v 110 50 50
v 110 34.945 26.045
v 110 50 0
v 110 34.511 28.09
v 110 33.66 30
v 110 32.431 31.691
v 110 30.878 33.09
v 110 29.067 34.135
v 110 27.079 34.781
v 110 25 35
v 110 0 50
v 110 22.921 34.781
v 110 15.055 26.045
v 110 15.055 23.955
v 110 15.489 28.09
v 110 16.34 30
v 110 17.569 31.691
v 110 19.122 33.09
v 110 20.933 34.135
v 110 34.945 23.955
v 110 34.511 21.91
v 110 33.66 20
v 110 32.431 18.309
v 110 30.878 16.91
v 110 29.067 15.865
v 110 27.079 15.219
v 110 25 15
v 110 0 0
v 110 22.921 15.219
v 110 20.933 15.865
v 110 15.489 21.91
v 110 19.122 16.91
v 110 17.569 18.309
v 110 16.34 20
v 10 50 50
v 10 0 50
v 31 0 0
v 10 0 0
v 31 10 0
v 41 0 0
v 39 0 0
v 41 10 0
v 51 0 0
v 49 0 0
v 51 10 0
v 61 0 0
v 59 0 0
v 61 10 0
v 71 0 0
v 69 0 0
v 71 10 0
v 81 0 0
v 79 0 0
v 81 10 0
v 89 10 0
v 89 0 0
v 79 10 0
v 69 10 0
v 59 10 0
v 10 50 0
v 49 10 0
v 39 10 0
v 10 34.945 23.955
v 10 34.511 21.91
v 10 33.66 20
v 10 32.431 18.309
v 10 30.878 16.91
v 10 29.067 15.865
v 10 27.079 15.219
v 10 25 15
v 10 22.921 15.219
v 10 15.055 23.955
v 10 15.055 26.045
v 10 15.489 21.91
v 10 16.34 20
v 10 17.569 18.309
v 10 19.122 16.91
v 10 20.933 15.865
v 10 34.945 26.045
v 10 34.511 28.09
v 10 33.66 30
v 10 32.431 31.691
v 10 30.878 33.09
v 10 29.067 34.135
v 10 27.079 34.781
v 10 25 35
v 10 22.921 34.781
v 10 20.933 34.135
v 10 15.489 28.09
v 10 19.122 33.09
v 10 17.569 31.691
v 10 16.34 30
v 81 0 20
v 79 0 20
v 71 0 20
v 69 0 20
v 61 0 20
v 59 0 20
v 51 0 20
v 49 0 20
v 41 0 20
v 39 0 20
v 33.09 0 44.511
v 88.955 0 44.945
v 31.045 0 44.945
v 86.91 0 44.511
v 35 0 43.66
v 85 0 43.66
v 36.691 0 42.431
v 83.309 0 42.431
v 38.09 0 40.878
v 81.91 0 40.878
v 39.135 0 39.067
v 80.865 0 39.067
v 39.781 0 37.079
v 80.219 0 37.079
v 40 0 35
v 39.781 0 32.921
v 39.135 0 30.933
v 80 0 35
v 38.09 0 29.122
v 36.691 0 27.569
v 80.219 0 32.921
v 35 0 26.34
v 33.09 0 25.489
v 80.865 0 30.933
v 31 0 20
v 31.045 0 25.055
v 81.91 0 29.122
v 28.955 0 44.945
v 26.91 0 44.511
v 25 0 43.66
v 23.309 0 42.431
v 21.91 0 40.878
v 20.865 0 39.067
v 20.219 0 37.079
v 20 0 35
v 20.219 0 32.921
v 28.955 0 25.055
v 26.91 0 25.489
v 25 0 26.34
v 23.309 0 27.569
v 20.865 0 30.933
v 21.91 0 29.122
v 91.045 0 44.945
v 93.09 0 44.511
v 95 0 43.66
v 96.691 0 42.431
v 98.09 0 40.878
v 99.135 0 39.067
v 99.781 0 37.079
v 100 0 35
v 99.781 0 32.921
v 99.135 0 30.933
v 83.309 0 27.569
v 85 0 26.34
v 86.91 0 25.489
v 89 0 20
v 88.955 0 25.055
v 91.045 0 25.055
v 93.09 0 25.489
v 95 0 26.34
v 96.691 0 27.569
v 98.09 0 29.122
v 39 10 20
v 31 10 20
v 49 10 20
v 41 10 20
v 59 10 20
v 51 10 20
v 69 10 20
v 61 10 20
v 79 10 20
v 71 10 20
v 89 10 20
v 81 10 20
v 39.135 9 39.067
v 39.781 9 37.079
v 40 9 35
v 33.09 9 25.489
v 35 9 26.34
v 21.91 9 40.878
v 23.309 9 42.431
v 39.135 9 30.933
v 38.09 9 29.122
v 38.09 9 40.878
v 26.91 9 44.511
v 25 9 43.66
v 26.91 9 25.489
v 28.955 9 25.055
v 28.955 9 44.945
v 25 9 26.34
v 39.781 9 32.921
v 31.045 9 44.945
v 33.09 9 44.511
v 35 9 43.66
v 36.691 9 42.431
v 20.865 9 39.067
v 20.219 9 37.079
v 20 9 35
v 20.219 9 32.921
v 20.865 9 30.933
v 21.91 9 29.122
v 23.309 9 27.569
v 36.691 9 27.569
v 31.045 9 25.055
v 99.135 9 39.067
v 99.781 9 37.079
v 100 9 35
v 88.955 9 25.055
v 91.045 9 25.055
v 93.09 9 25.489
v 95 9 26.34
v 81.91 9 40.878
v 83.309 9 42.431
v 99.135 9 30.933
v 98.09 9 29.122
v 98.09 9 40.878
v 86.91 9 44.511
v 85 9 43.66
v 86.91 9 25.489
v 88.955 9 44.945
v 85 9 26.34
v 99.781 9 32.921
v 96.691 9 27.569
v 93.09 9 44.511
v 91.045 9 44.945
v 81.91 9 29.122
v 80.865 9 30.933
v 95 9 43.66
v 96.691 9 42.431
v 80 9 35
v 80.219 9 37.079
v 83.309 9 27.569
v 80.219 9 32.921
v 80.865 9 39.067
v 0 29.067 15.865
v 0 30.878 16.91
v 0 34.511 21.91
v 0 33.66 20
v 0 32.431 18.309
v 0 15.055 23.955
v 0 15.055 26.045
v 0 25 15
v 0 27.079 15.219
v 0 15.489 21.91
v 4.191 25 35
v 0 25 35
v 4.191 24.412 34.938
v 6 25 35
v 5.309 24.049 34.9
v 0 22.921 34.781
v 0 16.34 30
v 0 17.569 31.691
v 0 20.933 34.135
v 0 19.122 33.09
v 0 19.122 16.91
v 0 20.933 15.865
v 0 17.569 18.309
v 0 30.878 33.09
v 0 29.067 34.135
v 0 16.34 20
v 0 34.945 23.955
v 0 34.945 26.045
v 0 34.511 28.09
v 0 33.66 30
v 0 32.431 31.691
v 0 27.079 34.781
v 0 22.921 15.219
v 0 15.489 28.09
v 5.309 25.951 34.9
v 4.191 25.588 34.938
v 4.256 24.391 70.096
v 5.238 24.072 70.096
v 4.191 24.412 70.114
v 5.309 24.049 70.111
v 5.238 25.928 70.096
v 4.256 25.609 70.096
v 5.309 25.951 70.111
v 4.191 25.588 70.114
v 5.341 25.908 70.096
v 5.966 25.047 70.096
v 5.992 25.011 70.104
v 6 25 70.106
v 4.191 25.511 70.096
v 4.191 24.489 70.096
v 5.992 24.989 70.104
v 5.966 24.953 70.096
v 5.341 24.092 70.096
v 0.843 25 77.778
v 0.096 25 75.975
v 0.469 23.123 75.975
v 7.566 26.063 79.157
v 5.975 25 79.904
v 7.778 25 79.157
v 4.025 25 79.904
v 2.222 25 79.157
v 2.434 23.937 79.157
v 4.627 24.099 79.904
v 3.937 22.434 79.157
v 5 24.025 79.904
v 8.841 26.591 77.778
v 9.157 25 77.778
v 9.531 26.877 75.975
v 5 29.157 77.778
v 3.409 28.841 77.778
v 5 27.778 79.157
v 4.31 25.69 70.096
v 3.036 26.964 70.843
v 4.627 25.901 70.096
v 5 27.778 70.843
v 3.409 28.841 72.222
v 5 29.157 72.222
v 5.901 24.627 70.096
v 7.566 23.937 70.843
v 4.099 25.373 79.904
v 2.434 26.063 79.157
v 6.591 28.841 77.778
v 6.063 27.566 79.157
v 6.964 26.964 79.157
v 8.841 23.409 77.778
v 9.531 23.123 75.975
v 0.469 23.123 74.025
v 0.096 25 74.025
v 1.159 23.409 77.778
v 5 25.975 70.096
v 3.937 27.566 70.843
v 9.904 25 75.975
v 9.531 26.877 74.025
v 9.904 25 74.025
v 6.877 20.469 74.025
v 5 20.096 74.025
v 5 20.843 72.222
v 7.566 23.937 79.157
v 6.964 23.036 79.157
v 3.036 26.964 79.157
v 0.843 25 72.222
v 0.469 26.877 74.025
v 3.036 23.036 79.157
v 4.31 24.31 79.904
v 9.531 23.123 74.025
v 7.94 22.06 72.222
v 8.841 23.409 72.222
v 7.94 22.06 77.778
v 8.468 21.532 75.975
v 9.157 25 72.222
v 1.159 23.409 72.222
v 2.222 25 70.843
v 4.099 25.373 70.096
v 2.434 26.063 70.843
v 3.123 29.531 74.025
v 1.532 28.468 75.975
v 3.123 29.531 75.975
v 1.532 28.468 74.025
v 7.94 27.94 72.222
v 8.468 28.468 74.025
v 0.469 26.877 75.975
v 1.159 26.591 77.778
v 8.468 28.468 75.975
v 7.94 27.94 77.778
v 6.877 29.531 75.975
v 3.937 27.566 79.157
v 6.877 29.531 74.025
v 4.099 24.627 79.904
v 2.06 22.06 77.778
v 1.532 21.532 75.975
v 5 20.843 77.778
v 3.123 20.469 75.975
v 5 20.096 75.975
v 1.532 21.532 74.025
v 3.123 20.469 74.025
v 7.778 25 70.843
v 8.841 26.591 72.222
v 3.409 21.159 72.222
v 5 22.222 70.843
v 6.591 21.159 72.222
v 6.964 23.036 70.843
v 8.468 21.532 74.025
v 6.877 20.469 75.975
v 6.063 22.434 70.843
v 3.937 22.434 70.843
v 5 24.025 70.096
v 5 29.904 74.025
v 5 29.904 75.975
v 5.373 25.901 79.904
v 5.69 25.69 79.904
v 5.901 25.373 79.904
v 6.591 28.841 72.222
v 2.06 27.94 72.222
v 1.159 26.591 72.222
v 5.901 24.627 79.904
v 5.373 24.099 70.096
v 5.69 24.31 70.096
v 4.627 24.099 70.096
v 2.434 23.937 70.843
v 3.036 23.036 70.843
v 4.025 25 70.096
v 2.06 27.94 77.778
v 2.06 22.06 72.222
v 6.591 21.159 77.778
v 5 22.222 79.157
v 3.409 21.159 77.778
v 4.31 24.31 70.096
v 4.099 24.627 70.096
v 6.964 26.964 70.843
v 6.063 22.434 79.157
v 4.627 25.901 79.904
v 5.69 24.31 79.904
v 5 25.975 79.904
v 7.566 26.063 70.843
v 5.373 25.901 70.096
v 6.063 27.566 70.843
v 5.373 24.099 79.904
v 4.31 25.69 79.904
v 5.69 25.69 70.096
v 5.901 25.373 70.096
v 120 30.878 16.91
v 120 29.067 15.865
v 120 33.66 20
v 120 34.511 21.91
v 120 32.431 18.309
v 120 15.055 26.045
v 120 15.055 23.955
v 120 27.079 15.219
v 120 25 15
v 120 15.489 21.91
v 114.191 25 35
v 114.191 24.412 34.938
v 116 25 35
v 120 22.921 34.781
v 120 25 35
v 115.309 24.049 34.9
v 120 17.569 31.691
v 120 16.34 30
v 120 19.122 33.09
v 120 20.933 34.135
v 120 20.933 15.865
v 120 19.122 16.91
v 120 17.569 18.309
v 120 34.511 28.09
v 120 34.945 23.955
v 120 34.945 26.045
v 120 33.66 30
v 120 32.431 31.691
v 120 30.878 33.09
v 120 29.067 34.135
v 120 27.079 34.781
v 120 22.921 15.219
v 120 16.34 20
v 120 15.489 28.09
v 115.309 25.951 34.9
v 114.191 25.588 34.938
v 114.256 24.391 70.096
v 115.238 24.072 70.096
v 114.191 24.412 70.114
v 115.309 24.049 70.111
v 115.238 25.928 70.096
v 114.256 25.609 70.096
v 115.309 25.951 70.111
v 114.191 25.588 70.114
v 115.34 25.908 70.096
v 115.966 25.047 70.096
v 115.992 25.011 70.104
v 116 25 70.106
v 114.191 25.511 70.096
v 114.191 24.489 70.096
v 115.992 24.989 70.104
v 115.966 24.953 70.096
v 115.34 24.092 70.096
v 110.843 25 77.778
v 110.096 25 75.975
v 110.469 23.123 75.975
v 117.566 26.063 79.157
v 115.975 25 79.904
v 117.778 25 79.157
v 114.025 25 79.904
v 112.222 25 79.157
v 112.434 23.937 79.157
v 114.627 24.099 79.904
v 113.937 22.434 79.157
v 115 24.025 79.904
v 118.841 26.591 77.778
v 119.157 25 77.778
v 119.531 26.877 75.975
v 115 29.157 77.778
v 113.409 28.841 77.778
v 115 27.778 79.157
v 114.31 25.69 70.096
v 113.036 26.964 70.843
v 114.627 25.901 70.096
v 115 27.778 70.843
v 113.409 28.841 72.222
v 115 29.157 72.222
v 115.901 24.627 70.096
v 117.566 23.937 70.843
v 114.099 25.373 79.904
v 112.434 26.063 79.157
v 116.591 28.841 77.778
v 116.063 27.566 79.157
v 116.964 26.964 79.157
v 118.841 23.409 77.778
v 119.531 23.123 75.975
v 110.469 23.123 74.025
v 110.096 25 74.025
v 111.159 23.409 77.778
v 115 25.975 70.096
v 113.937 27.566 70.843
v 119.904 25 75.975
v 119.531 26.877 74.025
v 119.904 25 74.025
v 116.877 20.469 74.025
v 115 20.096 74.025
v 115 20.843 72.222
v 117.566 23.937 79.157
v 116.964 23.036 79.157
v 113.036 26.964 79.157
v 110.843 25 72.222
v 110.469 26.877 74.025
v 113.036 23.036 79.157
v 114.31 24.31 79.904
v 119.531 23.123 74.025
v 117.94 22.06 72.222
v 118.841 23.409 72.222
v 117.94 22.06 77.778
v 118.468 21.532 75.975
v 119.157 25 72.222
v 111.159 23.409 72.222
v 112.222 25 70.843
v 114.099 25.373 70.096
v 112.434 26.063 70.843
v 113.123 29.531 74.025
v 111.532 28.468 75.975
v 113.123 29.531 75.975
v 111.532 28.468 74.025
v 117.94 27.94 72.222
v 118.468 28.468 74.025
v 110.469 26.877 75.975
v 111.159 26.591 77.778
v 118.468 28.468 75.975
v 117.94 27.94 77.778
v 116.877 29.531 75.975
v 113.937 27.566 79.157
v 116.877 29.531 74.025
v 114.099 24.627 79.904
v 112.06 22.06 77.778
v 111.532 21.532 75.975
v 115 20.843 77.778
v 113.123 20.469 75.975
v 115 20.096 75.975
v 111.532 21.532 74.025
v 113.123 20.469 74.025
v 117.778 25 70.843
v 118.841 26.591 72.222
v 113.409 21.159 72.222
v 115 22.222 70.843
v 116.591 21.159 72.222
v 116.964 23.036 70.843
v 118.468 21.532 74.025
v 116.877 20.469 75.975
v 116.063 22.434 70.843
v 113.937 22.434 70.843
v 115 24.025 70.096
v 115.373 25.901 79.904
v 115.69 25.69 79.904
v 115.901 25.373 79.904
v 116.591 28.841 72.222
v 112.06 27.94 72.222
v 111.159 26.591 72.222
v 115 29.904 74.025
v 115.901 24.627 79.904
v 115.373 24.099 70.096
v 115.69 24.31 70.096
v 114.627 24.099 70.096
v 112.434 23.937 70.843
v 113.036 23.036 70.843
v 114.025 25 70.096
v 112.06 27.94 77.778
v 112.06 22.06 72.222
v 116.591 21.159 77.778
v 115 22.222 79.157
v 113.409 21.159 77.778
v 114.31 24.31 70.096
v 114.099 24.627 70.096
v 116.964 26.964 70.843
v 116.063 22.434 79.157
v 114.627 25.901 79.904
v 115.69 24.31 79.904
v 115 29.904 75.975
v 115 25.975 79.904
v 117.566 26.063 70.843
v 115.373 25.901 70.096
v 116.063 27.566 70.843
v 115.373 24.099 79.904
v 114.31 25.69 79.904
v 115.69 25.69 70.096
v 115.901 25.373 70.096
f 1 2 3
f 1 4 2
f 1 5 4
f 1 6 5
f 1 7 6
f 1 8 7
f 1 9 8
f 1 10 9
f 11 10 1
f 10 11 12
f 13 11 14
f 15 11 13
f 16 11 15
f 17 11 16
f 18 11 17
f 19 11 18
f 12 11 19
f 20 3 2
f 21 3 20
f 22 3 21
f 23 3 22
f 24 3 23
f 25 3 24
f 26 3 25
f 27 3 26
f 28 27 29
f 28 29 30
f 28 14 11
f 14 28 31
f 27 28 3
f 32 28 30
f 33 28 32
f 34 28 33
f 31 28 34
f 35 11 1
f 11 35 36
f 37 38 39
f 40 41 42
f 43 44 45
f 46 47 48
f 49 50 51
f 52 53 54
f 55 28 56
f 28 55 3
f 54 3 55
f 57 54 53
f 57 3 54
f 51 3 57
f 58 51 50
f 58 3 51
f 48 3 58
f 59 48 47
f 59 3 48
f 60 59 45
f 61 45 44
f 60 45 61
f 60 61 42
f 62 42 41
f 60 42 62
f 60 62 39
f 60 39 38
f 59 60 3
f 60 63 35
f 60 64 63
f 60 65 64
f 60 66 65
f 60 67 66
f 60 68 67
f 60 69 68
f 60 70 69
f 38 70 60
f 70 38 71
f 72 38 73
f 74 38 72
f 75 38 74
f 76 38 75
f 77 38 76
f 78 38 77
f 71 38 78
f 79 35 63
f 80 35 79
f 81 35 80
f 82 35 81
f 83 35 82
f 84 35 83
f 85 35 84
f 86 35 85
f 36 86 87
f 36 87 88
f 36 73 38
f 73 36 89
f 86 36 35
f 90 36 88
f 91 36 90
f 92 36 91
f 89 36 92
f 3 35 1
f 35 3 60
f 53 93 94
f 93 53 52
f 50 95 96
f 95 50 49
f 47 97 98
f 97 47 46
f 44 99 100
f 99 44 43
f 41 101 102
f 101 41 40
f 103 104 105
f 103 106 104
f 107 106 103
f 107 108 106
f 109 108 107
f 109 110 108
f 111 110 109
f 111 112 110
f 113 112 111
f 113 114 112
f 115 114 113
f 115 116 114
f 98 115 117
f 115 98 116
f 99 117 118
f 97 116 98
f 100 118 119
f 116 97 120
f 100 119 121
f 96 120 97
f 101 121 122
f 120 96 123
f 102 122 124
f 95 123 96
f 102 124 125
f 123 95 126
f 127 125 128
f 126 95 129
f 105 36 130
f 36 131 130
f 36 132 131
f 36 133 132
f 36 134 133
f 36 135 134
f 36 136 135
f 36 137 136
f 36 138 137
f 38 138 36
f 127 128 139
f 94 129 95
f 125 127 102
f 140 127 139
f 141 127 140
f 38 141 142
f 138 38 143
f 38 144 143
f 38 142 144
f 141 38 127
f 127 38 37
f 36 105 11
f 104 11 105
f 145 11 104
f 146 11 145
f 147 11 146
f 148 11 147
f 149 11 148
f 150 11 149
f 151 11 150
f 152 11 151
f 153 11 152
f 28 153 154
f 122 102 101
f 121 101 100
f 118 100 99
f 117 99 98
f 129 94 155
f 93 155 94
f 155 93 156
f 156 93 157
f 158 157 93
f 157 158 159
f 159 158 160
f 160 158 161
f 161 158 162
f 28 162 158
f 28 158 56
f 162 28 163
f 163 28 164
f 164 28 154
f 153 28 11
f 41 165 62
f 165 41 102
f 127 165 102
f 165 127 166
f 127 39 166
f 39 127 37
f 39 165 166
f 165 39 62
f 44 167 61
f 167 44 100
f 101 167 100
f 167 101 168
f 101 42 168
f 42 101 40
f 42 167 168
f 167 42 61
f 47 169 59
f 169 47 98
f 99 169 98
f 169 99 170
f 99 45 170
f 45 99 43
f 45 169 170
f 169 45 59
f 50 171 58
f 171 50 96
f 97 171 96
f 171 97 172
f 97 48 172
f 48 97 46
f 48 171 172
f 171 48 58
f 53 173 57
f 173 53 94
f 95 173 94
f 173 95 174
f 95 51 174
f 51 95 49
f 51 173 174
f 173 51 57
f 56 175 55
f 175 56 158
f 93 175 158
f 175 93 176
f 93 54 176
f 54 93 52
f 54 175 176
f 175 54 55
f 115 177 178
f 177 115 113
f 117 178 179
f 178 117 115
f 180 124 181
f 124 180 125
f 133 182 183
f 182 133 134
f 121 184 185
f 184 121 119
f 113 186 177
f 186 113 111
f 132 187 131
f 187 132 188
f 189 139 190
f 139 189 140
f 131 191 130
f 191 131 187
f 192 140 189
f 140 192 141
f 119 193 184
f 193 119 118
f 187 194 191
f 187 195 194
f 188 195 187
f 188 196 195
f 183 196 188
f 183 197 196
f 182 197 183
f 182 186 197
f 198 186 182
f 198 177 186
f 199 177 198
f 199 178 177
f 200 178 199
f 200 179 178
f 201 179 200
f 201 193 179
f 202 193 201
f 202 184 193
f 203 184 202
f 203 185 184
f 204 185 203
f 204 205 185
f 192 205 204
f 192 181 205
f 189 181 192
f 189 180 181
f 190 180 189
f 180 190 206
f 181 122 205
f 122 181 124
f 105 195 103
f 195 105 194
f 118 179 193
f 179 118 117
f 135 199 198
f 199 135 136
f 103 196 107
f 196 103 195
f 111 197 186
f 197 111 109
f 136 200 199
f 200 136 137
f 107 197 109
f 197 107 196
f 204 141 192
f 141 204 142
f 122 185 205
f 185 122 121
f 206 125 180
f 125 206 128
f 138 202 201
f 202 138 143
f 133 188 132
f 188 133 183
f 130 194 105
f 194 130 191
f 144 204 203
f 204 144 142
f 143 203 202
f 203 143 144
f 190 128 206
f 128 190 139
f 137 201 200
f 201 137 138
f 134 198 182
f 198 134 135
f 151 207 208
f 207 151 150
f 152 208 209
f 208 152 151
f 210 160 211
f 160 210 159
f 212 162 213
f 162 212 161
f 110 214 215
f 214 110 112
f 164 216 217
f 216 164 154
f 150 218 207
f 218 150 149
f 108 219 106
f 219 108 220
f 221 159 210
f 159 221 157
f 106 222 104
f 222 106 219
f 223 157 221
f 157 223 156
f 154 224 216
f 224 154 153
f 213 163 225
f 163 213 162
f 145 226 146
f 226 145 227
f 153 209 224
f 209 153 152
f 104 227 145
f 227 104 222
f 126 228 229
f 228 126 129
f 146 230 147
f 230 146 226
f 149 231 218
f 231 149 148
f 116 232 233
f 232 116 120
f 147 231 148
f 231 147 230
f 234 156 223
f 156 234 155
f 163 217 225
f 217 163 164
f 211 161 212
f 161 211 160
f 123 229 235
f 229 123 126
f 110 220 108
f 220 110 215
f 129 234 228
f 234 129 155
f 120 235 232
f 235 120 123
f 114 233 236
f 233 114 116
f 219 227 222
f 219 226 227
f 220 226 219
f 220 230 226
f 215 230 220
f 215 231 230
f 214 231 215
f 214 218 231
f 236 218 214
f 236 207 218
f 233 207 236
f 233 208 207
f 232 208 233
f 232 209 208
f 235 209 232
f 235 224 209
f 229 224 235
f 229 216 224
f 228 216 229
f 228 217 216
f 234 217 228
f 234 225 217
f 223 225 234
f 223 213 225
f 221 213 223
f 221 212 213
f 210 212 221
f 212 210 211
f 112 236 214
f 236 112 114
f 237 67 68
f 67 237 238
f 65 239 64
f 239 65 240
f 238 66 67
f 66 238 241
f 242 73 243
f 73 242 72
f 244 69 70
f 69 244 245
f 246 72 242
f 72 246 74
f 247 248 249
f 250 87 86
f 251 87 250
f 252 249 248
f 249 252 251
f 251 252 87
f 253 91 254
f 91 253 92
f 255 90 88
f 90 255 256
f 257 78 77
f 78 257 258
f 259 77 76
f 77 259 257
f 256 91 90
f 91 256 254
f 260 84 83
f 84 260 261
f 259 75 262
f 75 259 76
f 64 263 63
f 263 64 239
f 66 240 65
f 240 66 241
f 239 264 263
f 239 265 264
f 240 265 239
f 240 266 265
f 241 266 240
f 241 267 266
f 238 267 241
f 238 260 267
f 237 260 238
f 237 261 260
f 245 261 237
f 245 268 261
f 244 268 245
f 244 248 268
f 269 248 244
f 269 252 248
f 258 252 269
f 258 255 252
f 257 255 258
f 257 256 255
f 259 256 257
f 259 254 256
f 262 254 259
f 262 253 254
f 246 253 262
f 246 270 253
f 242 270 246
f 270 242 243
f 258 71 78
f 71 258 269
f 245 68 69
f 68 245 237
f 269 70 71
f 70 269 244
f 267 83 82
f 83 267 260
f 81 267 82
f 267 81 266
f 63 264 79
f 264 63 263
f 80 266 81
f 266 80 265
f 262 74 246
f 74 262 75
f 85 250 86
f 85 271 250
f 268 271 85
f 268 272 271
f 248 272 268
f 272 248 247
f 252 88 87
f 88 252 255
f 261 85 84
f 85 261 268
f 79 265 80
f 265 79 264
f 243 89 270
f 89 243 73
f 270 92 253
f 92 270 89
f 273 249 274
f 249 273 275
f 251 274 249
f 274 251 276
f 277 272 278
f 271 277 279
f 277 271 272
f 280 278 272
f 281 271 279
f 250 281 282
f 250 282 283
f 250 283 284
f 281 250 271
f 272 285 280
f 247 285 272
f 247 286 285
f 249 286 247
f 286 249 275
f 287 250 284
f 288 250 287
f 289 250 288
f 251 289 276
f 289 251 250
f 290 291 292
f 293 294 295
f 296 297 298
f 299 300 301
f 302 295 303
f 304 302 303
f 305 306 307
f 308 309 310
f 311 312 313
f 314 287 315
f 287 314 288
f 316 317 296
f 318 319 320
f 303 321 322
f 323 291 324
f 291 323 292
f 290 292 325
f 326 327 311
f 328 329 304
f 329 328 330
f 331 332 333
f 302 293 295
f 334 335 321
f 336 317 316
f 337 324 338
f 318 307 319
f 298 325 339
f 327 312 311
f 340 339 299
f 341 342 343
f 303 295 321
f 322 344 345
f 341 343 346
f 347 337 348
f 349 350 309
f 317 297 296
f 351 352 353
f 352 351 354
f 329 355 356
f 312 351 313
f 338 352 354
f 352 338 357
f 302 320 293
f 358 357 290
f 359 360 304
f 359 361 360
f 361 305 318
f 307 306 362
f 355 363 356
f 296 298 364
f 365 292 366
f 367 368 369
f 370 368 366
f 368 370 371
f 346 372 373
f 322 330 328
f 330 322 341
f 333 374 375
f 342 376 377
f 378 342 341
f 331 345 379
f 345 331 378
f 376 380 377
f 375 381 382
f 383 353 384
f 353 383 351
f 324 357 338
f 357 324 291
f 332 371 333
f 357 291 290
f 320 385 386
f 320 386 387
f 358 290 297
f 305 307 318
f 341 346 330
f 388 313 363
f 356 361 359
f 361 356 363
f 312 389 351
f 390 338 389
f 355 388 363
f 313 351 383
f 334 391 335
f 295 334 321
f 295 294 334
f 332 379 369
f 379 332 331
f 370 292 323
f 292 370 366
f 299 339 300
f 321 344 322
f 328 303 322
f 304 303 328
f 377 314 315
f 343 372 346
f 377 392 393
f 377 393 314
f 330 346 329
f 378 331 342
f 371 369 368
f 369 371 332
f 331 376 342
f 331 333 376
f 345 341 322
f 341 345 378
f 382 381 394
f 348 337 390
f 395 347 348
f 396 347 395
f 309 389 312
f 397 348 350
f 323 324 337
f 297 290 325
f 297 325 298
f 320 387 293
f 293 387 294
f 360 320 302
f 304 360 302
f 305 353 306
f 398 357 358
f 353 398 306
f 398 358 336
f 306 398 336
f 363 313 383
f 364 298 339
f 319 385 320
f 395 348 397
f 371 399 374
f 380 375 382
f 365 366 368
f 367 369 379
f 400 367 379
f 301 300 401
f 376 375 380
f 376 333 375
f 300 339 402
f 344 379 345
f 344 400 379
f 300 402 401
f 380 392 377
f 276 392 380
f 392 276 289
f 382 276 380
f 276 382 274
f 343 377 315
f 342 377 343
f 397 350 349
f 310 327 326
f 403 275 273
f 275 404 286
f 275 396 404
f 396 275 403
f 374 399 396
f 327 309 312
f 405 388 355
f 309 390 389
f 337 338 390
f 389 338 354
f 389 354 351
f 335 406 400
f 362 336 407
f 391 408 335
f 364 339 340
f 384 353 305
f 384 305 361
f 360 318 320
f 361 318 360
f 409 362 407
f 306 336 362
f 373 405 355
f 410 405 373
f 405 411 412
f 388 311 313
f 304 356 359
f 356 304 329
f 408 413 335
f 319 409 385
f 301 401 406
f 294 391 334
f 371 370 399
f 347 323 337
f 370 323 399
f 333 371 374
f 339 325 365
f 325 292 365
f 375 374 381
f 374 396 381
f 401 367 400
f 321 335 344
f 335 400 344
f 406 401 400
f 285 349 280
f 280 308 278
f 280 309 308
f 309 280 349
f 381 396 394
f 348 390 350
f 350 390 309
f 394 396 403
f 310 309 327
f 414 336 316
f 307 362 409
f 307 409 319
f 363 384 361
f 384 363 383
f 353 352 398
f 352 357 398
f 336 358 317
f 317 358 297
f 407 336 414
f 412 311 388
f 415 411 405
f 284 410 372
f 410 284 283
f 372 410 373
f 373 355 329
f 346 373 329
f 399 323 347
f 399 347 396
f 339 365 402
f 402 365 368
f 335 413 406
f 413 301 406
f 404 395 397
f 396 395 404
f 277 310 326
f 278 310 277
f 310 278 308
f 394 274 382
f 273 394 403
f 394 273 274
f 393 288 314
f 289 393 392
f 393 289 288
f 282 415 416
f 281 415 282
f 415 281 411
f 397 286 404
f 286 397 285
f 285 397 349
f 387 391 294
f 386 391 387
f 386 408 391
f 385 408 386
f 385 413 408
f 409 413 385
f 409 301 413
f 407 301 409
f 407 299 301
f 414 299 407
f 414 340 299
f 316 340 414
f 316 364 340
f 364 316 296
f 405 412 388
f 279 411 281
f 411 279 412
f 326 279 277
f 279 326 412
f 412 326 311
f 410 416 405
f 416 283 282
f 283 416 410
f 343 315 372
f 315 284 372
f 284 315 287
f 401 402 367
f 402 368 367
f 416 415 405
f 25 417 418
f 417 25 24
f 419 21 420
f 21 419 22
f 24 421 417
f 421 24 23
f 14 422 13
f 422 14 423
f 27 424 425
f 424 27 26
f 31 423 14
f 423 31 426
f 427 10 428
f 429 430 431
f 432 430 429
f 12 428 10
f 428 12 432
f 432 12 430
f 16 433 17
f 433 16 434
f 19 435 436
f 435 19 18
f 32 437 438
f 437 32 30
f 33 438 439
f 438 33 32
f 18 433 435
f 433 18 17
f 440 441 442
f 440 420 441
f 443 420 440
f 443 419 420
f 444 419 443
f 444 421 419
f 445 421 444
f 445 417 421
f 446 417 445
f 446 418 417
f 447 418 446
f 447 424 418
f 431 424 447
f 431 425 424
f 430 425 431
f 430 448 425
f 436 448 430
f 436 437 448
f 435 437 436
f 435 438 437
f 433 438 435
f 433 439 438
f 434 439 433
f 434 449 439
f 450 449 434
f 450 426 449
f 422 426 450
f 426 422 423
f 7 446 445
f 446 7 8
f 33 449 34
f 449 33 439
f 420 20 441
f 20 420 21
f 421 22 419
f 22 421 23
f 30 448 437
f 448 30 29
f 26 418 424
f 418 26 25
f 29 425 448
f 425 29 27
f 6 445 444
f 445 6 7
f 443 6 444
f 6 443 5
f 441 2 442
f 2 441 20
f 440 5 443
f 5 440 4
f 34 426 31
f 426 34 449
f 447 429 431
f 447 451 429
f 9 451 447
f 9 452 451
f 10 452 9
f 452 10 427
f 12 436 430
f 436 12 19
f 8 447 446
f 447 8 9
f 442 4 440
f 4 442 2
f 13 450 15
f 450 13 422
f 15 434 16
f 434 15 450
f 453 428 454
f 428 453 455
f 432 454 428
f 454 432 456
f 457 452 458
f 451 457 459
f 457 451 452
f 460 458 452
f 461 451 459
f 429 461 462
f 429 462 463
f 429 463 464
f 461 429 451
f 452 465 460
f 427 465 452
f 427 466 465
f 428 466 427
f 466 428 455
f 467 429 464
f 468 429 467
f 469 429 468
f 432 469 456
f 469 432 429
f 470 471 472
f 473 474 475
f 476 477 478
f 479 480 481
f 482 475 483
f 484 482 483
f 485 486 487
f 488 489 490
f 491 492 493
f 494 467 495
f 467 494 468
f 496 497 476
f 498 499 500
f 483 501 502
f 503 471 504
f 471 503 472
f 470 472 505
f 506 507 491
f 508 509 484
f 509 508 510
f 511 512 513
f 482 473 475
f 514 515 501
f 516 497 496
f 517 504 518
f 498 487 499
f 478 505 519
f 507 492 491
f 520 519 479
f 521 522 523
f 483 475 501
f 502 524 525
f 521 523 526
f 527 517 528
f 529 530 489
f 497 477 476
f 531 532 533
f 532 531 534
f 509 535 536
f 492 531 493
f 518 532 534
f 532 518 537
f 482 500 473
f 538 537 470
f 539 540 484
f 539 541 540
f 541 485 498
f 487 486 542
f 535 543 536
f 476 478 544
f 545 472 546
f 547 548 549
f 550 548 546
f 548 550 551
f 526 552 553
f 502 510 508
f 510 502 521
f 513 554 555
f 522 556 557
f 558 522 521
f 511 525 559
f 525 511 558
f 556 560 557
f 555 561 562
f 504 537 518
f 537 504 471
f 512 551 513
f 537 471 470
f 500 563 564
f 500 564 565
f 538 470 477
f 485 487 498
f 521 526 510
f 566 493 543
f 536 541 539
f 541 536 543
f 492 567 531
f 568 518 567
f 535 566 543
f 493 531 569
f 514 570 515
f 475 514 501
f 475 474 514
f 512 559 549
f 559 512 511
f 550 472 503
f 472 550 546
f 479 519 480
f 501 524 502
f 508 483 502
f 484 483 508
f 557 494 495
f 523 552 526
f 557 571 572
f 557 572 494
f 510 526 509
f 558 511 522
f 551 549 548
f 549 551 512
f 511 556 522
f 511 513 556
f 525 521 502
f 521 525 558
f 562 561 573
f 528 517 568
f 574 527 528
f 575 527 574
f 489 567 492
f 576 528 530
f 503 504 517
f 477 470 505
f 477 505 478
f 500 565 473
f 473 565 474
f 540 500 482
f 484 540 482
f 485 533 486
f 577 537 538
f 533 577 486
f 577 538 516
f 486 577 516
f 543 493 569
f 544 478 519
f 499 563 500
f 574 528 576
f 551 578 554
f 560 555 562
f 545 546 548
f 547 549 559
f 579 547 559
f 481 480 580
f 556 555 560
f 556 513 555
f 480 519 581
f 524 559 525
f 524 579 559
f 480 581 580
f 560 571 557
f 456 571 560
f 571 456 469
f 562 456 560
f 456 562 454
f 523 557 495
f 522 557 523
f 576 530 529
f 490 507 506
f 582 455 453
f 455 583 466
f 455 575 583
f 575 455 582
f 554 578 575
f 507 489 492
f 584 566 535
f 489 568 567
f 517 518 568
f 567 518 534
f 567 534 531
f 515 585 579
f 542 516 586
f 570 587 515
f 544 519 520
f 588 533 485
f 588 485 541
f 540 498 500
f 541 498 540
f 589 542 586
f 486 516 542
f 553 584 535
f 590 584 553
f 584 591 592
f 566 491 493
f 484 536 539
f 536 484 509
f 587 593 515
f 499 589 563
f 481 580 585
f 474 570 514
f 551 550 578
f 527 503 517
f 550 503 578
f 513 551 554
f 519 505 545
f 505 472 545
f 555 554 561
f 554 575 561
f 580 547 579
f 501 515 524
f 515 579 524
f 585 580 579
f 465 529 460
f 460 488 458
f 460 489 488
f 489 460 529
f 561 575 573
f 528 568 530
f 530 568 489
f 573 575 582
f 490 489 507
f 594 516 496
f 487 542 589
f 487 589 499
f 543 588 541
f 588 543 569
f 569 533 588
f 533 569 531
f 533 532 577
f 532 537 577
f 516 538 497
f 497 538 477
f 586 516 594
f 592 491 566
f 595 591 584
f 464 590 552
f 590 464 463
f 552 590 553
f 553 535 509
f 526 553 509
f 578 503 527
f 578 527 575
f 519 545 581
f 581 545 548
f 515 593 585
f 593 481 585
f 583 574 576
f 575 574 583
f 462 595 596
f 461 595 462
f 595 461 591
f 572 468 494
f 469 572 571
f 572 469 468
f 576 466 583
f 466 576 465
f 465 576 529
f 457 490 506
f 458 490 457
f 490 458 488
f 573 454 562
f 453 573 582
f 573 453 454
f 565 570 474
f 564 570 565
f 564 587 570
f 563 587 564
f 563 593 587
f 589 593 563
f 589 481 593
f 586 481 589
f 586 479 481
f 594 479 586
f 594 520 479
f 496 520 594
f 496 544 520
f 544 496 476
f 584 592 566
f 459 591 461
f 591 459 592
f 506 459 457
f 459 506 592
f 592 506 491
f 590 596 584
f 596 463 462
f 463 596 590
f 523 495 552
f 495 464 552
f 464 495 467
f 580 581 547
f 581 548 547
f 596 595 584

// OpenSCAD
// [FL_INDEX: keywords="openscad, 3d_parametric, Parametric_Robot_Head, csg_solid" | COT="Parametric OpenSCAD design from 3DCodeverse"]
// Title: Parametric Robot Head

////////////////////////////////////////
//
//     By: Jeff Crossman
//	  For: Golan Levin's IACD 2014
//		   Carnegie Mellon University
//	Title: Parametric Robot Head
//
/////////////////////////////////////// 


////////////////////////////////////////
//									//
//		PARAMETRIC PARAMETERS		//
//									//
////////////////////////////////////////

AntennaHeight = 50;		// Default: 50
AntennaBallRadius = 5;	// Default: 5
EyeDiameter = 10;		// Default: 10
EyeSpacingOffset = 0;	// Default: 0
MouthHeight = 20;		// Default: 20


//////////////   END   /////////////////



// Head
translate([10, 0, 0]){
difference() {
	// Base head
	cube([100, 50, 50]);

	// Mouth
	translate([21, 0, 0]){
		cube([8, 10, MouthHeight]);
	}
	translate([31, 0, 0]){
		cube([8, 10, MouthHeight]);
	}
	translate([41, 0, 0]){
		cube([8, 10, MouthHeight]);
	}
	translate([51, 0, 0]){
		cube([8, 10, MouthHeight]);
	}
	translate([61, 0, 0]){
		cube([8, 10, MouthHeight]);
	}
	translate([71, 0, 0]){
		cube([8, 10, MouthHeight]);
	}

	// Left Eye
	translate([20+EyeSpacingOffset, 4, 35]){
		rotate(a=[90, 0, 0]) {
			cylinder(10, EyeDiameter, EyeDiameter, center=true);
		}
	}

	// Right Eye
	translate([80-EyeSpacingOffset, 4, 35]){
		rotate(a=[90, 0, 0]) {
			cylinder(10, EyeDiameter, EyeDiameter, center=true);
		}
	}
}
}

// Left Ear
translate([5, 25, 25]){
	rotate(a=[0, 90, 0]) {
		cylinder(10, 10, 10, center=true);
	}
}
translate([5, 25, (25+(AntennaHeight/2))]){
	cylinder(AntennaHeight, 1, 1, center=true);
}
translate([5, 25, 25+AntennaHeight]){
	sphere(AntennaBallRadius);
}

// Right Ear
translate([115, 25, 25]){
	rotate(a=[0, 90, 0]) {
		cylinder(10, 10, 10, center=true);
	}
}
translate([115, 25, (25+(AntennaHeight/2))]){
	cylinder(AntennaHeight, 1, 1, center=true);
}
translate([115, 25, 25+AntennaHeight]){
	sphere(AntennaBallRadius);
}
